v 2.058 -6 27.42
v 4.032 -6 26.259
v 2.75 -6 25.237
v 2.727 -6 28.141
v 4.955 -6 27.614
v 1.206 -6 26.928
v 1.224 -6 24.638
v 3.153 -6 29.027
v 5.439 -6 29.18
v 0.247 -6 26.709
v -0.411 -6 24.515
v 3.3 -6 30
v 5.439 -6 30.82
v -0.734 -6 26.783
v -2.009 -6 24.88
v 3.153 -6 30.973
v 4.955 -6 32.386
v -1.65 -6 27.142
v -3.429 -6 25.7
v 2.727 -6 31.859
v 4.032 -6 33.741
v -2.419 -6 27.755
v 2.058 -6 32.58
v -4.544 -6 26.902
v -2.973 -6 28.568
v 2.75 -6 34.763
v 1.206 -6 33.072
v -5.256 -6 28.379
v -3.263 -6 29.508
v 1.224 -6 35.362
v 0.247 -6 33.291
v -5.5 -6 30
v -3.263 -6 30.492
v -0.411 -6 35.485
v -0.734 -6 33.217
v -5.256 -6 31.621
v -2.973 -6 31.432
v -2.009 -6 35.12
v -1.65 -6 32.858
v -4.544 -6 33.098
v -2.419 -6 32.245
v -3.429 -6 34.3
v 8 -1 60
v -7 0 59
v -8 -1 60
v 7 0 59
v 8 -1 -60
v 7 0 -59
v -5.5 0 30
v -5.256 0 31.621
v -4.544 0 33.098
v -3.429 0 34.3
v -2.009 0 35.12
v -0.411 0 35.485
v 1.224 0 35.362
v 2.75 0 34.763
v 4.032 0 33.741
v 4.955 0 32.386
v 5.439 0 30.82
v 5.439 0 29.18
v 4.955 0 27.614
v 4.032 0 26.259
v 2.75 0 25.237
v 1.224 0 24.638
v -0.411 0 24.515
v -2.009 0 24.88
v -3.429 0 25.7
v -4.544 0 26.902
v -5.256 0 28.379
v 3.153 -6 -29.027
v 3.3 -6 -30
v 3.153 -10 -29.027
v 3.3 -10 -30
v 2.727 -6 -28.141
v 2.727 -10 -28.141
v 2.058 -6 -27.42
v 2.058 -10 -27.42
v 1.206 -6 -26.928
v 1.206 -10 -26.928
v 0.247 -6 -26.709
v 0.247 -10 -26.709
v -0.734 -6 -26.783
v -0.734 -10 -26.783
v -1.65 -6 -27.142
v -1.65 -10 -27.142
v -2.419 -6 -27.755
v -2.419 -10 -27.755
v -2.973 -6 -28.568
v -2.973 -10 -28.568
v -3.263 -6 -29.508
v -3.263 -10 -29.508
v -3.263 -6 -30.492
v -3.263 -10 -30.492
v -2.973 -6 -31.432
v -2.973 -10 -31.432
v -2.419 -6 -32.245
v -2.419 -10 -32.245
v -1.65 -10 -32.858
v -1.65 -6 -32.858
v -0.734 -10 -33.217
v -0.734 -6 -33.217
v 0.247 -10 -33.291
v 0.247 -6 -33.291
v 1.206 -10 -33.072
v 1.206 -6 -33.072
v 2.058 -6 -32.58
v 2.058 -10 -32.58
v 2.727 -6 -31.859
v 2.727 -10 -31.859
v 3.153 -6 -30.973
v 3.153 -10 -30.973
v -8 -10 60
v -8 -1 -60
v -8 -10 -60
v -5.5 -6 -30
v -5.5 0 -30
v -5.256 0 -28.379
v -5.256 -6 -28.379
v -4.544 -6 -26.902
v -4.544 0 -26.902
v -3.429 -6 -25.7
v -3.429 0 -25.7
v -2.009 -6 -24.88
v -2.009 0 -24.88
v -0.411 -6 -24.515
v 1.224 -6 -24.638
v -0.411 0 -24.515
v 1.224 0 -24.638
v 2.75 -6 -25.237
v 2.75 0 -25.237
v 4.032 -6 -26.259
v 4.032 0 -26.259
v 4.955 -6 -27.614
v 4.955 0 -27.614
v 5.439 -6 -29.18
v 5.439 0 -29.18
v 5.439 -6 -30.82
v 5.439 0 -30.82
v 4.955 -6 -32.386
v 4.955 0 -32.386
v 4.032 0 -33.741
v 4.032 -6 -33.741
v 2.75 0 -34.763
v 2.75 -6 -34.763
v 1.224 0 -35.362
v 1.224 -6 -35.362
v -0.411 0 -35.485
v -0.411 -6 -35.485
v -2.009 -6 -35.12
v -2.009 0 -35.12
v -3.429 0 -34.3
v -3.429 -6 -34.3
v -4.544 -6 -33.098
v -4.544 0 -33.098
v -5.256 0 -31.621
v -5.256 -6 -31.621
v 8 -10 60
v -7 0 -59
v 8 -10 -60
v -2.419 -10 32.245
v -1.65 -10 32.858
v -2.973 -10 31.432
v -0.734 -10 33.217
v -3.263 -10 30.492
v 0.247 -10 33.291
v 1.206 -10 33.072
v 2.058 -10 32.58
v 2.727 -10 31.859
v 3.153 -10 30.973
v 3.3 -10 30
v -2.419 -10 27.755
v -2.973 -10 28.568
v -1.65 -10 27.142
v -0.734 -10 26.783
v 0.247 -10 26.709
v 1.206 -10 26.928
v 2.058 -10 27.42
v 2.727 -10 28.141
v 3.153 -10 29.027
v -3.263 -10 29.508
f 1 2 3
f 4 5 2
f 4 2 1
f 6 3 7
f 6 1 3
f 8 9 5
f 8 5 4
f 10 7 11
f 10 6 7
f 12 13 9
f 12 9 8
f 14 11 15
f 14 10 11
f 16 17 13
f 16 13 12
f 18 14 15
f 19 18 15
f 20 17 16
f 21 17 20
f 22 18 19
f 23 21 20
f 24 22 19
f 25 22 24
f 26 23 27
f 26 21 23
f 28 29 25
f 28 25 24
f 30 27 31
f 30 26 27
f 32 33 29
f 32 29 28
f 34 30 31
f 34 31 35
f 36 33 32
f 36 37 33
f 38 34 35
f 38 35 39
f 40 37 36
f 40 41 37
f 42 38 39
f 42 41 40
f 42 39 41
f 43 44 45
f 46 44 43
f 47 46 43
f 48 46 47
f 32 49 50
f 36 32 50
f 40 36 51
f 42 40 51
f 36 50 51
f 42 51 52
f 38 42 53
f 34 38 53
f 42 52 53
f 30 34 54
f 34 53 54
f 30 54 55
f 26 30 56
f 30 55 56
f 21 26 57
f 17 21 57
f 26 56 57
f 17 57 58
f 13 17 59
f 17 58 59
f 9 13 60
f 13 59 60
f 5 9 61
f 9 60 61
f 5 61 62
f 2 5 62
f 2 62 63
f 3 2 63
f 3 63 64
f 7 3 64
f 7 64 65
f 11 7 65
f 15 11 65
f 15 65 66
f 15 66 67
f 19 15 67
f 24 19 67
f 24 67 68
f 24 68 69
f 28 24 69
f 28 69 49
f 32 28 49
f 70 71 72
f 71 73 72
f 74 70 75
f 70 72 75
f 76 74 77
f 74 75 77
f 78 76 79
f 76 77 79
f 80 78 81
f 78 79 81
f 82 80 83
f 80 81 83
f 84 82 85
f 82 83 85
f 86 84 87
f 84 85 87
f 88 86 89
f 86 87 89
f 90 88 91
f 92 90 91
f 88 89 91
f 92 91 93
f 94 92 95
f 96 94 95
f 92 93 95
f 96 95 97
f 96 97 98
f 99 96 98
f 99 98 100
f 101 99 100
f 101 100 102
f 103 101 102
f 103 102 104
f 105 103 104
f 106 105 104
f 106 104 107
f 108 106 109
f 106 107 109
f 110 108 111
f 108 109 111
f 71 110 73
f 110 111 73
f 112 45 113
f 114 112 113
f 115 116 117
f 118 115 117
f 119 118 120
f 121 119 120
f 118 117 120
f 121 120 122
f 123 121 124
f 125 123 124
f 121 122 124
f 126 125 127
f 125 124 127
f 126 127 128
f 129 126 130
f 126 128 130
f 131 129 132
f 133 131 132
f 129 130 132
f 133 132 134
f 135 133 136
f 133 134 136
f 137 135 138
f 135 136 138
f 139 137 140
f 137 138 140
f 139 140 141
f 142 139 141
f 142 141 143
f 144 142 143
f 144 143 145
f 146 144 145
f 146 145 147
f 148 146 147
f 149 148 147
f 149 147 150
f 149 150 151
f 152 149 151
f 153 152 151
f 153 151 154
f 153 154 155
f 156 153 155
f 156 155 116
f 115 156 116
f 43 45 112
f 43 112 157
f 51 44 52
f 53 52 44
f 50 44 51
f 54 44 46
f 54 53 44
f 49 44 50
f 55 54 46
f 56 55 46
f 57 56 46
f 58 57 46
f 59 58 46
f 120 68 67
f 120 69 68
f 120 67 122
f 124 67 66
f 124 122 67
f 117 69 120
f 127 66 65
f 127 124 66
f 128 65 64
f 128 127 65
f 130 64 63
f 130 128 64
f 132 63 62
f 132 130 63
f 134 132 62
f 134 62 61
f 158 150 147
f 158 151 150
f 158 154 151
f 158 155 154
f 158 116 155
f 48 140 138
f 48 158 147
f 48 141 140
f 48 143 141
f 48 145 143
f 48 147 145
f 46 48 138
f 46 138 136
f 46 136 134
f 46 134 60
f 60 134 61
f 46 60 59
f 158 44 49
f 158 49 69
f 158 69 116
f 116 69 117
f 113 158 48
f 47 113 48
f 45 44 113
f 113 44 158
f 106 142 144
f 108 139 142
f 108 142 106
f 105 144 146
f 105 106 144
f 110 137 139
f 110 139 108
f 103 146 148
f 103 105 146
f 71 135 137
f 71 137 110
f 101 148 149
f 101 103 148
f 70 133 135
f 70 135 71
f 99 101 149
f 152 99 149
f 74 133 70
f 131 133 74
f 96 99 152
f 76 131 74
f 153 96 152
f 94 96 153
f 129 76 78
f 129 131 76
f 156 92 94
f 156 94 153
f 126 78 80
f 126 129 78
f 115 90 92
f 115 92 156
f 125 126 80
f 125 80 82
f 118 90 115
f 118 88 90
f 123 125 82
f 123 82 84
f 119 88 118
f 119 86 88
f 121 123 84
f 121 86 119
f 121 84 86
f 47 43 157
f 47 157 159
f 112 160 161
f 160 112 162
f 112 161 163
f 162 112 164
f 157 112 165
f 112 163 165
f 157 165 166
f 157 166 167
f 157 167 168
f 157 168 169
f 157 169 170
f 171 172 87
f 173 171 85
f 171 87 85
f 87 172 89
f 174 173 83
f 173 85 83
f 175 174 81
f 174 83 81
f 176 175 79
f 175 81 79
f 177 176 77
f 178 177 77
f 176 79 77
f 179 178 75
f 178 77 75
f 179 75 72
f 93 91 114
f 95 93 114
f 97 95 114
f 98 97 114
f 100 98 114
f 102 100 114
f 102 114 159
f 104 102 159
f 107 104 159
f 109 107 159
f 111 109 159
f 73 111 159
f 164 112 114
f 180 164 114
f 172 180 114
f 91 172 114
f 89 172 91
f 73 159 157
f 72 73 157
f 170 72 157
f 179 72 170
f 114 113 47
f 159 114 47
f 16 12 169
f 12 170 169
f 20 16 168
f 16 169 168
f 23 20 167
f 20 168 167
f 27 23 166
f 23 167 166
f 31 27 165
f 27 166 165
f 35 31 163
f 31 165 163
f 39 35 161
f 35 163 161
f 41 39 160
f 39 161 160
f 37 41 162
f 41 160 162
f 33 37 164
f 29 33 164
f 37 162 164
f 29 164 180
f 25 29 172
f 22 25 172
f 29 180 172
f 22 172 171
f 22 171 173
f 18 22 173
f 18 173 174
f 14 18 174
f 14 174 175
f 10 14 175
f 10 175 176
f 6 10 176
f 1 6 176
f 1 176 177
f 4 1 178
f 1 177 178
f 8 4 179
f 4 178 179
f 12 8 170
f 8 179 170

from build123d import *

# Parameters (mm, degrees)
SKETCH_1_W                  = 16
SKETCH_1_H                  = 120
EXTRUDE_1_DEPTH             = 10
CHAMFER_1_SIZE              = 1
HOLE_WIZARD_M61_D           = 6.6
HOLE_WIZARD_M61_CBORE_D     = 11
HOLE_WIZARD_M61_CBORE_DEPTH = 6


with BuildPart() as part:
    # Эскиз1 → Бобышка-Вытянуть1 (new body)
    with BuildSketch(Plane(origin=(0, 0, 0), x_dir=(1, 0, 0), z_dir=(0, 1, 0))):
        Rectangle(SKETCH_1_W, SKETCH_1_H)
    extrude(amount=-EXTRUDE_1_DEPTH)

    # Фаска1
    chamfer_1_edges = [part.edges().sort_by_distance(p)[0] for p in [
        (0, 0, 60),
        (-8, 0, 0),
        (0, 0, -60),
        (8, 0, 0),
    ]]
    chamfer(chamfer_1_edges, length=CHAMFER_1_SIZE)

    # Цековка для винта с внутренним шестигранником M61 (through all)
    with Locations(Plane(origin=(0, 0, 0), x_dir=(-1, 0, 0), z_dir=(0, 1, 0))):
        with Locations((0, 30), (0, -30)):
            CounterBoreHole(HOLE_WIZARD_M61_D / 2, HOLE_WIZARD_M61_CBORE_D / 2, HOLE_WIZARD_M61_CBORE_DEPTH)


solid = part.part
